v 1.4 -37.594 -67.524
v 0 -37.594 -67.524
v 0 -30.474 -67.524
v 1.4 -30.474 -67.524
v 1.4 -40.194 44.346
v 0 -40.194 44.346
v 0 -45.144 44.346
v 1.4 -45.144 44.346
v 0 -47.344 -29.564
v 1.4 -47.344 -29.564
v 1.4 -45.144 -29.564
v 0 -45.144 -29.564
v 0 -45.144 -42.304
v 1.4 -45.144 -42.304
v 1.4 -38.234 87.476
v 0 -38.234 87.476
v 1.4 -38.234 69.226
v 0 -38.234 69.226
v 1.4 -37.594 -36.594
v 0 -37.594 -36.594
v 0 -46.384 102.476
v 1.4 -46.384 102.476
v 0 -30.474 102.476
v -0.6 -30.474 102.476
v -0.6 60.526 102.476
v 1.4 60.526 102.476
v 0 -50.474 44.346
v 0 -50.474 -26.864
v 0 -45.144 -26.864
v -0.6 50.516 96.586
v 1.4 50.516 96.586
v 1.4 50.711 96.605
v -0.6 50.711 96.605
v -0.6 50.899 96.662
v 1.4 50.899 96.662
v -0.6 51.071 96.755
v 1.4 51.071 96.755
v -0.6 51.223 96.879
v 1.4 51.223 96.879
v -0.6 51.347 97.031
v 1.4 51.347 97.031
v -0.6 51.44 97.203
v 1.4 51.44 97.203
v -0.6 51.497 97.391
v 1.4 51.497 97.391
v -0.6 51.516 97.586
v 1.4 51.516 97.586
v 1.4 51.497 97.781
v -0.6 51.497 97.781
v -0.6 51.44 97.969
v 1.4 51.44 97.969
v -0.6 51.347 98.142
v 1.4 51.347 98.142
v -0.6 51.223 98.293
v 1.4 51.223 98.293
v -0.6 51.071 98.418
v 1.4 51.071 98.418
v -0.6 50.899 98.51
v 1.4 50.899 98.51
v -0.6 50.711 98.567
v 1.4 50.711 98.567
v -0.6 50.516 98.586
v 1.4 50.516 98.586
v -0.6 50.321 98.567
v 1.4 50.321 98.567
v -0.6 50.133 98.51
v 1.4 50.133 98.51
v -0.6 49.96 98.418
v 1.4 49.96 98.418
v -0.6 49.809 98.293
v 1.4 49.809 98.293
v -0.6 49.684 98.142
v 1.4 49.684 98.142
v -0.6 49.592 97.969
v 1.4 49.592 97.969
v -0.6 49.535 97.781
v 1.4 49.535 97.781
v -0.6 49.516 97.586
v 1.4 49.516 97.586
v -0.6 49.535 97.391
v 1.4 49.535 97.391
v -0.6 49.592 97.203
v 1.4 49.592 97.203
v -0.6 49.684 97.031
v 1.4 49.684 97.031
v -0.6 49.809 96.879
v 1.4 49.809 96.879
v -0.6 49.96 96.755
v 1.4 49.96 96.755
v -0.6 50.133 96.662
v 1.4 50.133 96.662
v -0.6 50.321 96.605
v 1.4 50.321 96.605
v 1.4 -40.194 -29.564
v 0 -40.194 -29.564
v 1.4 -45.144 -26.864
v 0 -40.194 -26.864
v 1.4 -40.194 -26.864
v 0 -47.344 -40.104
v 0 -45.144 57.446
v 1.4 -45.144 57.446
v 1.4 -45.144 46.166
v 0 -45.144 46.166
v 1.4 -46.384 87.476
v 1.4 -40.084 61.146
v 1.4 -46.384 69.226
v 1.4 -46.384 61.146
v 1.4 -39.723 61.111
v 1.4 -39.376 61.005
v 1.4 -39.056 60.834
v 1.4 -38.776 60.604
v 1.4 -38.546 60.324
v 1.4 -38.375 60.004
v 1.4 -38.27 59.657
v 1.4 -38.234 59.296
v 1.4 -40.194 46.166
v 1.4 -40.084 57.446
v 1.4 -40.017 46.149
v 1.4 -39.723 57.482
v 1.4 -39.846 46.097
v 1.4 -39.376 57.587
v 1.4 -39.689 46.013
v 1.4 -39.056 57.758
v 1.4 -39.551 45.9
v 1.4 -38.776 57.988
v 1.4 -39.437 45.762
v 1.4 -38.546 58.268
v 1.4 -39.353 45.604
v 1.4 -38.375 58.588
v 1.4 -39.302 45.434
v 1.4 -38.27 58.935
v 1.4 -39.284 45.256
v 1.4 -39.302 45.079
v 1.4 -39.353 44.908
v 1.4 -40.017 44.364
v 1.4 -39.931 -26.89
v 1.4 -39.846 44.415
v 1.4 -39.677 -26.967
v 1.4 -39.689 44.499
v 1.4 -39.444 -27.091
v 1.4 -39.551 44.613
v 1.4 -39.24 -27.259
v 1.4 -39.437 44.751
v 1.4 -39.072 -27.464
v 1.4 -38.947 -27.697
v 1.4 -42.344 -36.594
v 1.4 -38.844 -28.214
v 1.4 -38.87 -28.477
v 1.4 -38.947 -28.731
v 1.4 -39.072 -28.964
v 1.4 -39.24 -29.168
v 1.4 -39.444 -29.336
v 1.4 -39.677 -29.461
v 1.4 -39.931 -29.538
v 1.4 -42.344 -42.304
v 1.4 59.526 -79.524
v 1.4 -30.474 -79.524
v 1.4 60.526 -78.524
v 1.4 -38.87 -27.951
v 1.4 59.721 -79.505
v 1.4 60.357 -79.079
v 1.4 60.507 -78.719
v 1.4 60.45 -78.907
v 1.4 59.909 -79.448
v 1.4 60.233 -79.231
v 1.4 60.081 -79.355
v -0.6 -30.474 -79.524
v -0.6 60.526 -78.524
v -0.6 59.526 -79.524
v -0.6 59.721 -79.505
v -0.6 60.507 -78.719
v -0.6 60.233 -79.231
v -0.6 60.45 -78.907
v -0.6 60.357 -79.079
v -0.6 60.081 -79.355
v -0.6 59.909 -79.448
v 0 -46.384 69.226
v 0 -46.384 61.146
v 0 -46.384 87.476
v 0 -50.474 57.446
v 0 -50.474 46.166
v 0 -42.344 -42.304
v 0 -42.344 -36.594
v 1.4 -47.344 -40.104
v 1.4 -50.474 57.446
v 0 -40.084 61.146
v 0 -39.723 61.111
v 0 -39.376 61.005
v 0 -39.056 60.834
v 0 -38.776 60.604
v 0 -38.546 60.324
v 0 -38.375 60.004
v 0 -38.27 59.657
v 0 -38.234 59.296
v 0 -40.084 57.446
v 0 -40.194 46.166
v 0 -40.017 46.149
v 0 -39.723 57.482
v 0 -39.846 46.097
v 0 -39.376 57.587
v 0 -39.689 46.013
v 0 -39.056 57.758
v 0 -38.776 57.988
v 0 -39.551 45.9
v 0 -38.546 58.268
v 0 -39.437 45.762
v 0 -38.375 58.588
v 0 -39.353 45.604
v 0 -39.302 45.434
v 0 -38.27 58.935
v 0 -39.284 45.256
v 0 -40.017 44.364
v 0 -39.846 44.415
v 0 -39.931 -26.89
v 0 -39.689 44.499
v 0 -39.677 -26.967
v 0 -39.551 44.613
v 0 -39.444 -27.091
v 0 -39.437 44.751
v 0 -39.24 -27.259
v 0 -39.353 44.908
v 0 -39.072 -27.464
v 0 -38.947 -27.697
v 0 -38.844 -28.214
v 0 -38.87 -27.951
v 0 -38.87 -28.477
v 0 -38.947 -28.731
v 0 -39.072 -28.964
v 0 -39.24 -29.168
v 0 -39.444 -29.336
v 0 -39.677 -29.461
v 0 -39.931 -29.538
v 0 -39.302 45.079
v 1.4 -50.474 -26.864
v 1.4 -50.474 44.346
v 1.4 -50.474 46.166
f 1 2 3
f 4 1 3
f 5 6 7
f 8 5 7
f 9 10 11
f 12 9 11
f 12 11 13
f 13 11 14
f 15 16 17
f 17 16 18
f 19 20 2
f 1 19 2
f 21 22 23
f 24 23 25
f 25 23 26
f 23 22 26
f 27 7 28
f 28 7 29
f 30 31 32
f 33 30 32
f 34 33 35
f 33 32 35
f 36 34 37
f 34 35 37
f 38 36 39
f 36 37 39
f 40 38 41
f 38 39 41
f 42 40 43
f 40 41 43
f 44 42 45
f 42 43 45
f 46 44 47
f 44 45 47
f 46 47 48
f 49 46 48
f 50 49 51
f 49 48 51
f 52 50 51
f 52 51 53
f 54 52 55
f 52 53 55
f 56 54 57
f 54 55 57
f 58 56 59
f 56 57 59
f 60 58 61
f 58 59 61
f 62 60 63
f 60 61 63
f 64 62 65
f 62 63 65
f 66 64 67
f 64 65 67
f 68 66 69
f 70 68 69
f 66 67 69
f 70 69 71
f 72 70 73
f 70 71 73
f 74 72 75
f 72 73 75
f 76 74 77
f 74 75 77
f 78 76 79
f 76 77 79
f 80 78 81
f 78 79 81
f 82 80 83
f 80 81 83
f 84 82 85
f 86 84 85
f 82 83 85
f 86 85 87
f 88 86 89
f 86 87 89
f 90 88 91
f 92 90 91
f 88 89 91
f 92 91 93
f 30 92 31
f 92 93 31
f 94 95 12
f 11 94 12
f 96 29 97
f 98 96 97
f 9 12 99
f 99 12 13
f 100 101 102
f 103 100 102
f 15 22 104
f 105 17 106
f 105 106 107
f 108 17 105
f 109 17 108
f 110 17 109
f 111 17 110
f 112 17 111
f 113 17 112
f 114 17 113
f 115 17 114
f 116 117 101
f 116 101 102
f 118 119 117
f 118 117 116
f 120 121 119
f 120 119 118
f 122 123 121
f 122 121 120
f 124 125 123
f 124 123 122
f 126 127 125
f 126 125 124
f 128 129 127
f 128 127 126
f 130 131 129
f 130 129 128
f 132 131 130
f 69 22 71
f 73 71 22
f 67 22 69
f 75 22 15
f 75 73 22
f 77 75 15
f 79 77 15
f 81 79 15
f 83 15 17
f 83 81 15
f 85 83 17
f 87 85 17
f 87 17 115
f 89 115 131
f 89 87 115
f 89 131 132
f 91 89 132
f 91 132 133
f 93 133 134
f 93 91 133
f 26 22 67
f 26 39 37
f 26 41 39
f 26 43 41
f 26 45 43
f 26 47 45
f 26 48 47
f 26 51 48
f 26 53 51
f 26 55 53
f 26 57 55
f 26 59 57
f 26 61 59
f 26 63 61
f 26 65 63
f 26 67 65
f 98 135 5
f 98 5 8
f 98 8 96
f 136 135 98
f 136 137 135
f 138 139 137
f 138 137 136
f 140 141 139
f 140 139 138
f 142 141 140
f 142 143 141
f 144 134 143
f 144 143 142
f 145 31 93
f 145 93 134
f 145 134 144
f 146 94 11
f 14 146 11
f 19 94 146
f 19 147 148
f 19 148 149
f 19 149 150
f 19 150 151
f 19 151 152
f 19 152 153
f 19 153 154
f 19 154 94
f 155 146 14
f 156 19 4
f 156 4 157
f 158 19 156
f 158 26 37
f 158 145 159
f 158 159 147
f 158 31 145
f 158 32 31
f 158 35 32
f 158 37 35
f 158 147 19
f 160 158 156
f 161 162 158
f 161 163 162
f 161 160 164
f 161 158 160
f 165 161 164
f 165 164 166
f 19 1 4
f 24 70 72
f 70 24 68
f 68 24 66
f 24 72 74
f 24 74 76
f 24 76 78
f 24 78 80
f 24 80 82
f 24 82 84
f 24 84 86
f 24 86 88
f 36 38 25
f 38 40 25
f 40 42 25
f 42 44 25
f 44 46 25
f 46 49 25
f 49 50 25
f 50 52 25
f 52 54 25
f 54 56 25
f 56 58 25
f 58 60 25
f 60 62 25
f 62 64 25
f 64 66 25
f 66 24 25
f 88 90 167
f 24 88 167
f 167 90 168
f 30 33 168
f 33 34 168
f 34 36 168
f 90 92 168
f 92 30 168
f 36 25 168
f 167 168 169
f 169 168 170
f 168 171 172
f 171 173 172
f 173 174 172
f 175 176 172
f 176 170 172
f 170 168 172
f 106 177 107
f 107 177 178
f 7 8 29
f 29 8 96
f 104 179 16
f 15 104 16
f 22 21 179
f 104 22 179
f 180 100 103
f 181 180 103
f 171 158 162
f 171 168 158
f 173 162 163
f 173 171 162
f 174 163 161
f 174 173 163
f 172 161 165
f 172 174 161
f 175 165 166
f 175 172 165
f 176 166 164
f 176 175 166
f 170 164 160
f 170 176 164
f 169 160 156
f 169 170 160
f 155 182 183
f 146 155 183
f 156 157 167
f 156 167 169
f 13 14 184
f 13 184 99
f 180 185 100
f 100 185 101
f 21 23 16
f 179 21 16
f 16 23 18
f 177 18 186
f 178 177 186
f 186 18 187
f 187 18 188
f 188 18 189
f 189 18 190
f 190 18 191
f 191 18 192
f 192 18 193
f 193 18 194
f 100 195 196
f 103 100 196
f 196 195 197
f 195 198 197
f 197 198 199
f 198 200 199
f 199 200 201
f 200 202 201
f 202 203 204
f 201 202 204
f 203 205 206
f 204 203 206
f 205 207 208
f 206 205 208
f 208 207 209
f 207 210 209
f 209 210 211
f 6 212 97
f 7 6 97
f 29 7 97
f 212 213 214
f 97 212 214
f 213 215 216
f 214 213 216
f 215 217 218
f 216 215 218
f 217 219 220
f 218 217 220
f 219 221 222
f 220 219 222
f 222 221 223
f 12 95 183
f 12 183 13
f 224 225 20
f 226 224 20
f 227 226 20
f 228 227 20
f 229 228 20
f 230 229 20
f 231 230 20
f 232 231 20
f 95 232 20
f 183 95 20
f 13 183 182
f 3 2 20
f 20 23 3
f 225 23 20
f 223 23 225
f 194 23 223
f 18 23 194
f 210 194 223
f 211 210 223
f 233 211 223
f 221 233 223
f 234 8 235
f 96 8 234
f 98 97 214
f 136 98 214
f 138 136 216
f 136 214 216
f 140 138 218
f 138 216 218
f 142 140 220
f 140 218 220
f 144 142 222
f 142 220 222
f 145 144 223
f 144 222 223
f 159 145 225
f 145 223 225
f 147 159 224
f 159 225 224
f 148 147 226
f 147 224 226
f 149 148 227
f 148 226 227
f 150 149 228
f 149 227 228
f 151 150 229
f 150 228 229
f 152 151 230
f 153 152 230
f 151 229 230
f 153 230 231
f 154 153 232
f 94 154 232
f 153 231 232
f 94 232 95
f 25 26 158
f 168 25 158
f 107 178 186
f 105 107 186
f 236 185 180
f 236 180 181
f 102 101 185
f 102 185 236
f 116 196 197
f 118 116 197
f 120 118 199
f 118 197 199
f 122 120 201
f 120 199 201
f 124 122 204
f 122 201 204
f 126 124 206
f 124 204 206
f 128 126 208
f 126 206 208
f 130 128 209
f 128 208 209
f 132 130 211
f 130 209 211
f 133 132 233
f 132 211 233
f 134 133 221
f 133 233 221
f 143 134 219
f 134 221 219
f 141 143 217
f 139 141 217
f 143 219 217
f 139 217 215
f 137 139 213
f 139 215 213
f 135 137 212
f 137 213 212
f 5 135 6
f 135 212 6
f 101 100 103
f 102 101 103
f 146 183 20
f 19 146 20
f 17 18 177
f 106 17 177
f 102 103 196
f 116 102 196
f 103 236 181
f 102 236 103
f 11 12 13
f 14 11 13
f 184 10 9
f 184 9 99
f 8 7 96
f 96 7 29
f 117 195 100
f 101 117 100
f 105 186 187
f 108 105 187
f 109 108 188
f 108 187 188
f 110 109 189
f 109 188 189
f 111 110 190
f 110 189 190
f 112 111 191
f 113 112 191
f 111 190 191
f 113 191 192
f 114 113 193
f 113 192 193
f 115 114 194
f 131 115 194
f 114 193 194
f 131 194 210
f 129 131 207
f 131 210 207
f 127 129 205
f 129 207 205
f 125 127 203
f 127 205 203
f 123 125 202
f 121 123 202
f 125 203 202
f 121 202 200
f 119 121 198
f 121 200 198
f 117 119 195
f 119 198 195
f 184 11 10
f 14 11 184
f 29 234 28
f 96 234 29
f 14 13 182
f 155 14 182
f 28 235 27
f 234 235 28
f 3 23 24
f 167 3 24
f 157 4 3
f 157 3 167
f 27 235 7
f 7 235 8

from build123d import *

# Parameters (mm, degrees)
EXTRUDE_1_DEPTH        = 1.4
SKETCH_3_W             = 71.21
SKETCH_3_H             = 5.33
EXTRUDE_2_DEPTH        = 1.4
SKETCH_3_W_2           = 12.74
SKETCH_3_H_2           = 2.2
EXTRUDE_2_2_DEPTH      = 1.4
SKETCH_3_W_3           = 11.28
EXTRUDE_2_3_DEPTH      = 1.4
CHAMFER_1_SIZE         = 2.2
SKETCH_5_W             = 182
SKETCH_5_H             = 91
EXTRUDE_4_DEPTH        = 2
SKETCH_6_R             = 1
CUT_EXTRUDE_2689_DEPTH = 2
FILLET_1_R             = 1


with BuildPart() as part:
    # 草图1 → 凸台-拉伸1 (new body)
    with BuildSketch(Plane(origin=(0, 0, 0), x_dir=(0, 0, -1), z_dir=(1, 0, 0))):
        with BuildLine():
            Line((-102.476101343, -30.47410665), (-102.476101343, -46.38410665))
            Line((-102.476101343, -46.38410665), (-87.476101343, -46.38410665))
            Line((-87.476101343, -46.38410665), (-87.476101343, -38.23410665))
            Line((-87.476101343, -38.23410665), (-69.226101343, -38.23410665))
            Line((-69.226101343, -38.23410665), (-69.226101343, -46.38410665))
            Line((-69.226101343, -46.38410665), (-61.146101343, -46.38410665))
            Line((-61.146101343, -46.38410665), (-61.146101343, -40.08410665))
            ThreePointArc((-61.146101343, -40.08410665), (-59.296101343, -38.23410665), (-57.446101343, -40.08410665))
            Line((-57.446101343, -40.08410665), (-57.446101343, -45.14410665))
            Line((-57.446101343, -45.14410665), (-46.166101343, -45.14410665))
            Line((-46.166101343, -45.14410665), (-46.166101343, -40.19410665))
            ThreePointArc((-46.166101343, -40.19410665), (-45.256101343, -39.28410665), (-44.346101343, -40.19410665))
            Line((-44.346101343, -40.19410665), (-44.346101343, -45.14410665))
            Line((-44.346101343, -45.14410665), (26.863898657, -45.14410665))
            Line((26.863898657, -45.14410665), (26.863898657, -40.19410665))
            ThreePointArc((26.863898657, -40.19410665), (28.213898657, -38.84410665), (29.563898657, -40.19410665))
            Line((29.563898657, -40.19410665), (29.563898657, -45.14410665))
            Line((29.563898657, -45.14410665), (42.303898657, -45.14410665))
            Line((42.303898657, -45.14410665), (42.303898657, -42.34410665))
            Line((42.303898657, -42.34410665), (36.593898657, -42.34410665))
            Line((36.593898657, -42.34410665), (36.593898657, -37.59410665))
            Line((36.593898657, -37.59410665), (67.523898657, -37.59410665))
            Line((67.523898657, -37.59410665), (67.523898657, -30.47410665))
            Line((67.523898657, -30.47410665), (-102.476101343, -30.47410665))
        make_face()
    extrude(amount=EXTRUDE_1_DEPTH)

    # 草图5 → 凸台-拉伸4 (add)
    with BuildSketch(Plane(origin=(1.4, 0, 0), x_dir=(0, 0, -1), z_dir=(1, 0, 0))):
        with Locations((-11.476101343, 15.02589335)):
            Rectangle(SKETCH_5_W, SKETCH_5_H)
    extrude(amount=-EXTRUDE_4_DEPTH)

    # 草图6 → Cut-Extrude 2689 (cut)
    with BuildSketch(Plane(origin=(1.4, 0, 0), x_dir=(0, 0, -1), z_dir=(1, 0, 0))):
        with Locations((-97.586101343, 50.51589335)):
            Circle(SKETCH_6_R)
    extrude(amount=-CUT_EXTRUDE_2689_DEPTH, mode=Mode.SUBTRACT)

    # 圆角1
    fillet_1_edges = [part.edges().sort_by_distance(p)[0] for p in [
        (0.4, 60.52589335, -79.523898657),
    ]]
    fillet(fillet_1_edges, radius=FILLET_1_R)


with BuildPart() as body_2:
    # 草图3 → 凸台-拉伸2 (new body)
    with BuildSketch(Plane(origin=(1.4, 0, 0), x_dir=(0, 0, -1), z_dir=(1, 0, 0))):
        with Locations((-8.741101343, -47.80910665)):
            Rectangle(SKETCH_3_W, SKETCH_3_H)
    extrude(amount=-EXTRUDE_2_DEPTH)


with BuildPart() as body_3:
    # 草图3 → Extrude 2 2 (new body)
    with BuildSketch(Plane(origin=(1.4, 0, 0), x_dir=(0, 0, -1), z_dir=(1, 0, 0))):
        with Locations((35.933898657, -46.24410665)):
            Rectangle(SKETCH_3_W_2, SKETCH_3_H_2)
    extrude(amount=-EXTRUDE_2_2_DEPTH)

    # 倒角1
    chamfer_1_edges = [body_3.edges().sort_by_distance(p)[0] for p in [
        (0.7, -47.34410665, -42.303898657),
    ]]
    chamfer(chamfer_1_edges, length=CHAMFER_1_SIZE - 0.0001)  # a hair under: the kernel refuses the full size


with BuildPart() as body_4:
    # 草图3 → Extrude 2 3 (new body)
    with BuildSketch(Plane(origin=(1.4, 0, 0), x_dir=(0, 0, -1), z_dir=(1, 0, 0))):
        with Locations((-51.806101343, -47.80910665)):
            Rectangle(SKETCH_3_W_3, SKETCH_3_H)
    extrude(amount=-EXTRUDE_2_3_DEPTH)


solid = Compound([part.part, body_2.part, body_3.part, body_4.part])
